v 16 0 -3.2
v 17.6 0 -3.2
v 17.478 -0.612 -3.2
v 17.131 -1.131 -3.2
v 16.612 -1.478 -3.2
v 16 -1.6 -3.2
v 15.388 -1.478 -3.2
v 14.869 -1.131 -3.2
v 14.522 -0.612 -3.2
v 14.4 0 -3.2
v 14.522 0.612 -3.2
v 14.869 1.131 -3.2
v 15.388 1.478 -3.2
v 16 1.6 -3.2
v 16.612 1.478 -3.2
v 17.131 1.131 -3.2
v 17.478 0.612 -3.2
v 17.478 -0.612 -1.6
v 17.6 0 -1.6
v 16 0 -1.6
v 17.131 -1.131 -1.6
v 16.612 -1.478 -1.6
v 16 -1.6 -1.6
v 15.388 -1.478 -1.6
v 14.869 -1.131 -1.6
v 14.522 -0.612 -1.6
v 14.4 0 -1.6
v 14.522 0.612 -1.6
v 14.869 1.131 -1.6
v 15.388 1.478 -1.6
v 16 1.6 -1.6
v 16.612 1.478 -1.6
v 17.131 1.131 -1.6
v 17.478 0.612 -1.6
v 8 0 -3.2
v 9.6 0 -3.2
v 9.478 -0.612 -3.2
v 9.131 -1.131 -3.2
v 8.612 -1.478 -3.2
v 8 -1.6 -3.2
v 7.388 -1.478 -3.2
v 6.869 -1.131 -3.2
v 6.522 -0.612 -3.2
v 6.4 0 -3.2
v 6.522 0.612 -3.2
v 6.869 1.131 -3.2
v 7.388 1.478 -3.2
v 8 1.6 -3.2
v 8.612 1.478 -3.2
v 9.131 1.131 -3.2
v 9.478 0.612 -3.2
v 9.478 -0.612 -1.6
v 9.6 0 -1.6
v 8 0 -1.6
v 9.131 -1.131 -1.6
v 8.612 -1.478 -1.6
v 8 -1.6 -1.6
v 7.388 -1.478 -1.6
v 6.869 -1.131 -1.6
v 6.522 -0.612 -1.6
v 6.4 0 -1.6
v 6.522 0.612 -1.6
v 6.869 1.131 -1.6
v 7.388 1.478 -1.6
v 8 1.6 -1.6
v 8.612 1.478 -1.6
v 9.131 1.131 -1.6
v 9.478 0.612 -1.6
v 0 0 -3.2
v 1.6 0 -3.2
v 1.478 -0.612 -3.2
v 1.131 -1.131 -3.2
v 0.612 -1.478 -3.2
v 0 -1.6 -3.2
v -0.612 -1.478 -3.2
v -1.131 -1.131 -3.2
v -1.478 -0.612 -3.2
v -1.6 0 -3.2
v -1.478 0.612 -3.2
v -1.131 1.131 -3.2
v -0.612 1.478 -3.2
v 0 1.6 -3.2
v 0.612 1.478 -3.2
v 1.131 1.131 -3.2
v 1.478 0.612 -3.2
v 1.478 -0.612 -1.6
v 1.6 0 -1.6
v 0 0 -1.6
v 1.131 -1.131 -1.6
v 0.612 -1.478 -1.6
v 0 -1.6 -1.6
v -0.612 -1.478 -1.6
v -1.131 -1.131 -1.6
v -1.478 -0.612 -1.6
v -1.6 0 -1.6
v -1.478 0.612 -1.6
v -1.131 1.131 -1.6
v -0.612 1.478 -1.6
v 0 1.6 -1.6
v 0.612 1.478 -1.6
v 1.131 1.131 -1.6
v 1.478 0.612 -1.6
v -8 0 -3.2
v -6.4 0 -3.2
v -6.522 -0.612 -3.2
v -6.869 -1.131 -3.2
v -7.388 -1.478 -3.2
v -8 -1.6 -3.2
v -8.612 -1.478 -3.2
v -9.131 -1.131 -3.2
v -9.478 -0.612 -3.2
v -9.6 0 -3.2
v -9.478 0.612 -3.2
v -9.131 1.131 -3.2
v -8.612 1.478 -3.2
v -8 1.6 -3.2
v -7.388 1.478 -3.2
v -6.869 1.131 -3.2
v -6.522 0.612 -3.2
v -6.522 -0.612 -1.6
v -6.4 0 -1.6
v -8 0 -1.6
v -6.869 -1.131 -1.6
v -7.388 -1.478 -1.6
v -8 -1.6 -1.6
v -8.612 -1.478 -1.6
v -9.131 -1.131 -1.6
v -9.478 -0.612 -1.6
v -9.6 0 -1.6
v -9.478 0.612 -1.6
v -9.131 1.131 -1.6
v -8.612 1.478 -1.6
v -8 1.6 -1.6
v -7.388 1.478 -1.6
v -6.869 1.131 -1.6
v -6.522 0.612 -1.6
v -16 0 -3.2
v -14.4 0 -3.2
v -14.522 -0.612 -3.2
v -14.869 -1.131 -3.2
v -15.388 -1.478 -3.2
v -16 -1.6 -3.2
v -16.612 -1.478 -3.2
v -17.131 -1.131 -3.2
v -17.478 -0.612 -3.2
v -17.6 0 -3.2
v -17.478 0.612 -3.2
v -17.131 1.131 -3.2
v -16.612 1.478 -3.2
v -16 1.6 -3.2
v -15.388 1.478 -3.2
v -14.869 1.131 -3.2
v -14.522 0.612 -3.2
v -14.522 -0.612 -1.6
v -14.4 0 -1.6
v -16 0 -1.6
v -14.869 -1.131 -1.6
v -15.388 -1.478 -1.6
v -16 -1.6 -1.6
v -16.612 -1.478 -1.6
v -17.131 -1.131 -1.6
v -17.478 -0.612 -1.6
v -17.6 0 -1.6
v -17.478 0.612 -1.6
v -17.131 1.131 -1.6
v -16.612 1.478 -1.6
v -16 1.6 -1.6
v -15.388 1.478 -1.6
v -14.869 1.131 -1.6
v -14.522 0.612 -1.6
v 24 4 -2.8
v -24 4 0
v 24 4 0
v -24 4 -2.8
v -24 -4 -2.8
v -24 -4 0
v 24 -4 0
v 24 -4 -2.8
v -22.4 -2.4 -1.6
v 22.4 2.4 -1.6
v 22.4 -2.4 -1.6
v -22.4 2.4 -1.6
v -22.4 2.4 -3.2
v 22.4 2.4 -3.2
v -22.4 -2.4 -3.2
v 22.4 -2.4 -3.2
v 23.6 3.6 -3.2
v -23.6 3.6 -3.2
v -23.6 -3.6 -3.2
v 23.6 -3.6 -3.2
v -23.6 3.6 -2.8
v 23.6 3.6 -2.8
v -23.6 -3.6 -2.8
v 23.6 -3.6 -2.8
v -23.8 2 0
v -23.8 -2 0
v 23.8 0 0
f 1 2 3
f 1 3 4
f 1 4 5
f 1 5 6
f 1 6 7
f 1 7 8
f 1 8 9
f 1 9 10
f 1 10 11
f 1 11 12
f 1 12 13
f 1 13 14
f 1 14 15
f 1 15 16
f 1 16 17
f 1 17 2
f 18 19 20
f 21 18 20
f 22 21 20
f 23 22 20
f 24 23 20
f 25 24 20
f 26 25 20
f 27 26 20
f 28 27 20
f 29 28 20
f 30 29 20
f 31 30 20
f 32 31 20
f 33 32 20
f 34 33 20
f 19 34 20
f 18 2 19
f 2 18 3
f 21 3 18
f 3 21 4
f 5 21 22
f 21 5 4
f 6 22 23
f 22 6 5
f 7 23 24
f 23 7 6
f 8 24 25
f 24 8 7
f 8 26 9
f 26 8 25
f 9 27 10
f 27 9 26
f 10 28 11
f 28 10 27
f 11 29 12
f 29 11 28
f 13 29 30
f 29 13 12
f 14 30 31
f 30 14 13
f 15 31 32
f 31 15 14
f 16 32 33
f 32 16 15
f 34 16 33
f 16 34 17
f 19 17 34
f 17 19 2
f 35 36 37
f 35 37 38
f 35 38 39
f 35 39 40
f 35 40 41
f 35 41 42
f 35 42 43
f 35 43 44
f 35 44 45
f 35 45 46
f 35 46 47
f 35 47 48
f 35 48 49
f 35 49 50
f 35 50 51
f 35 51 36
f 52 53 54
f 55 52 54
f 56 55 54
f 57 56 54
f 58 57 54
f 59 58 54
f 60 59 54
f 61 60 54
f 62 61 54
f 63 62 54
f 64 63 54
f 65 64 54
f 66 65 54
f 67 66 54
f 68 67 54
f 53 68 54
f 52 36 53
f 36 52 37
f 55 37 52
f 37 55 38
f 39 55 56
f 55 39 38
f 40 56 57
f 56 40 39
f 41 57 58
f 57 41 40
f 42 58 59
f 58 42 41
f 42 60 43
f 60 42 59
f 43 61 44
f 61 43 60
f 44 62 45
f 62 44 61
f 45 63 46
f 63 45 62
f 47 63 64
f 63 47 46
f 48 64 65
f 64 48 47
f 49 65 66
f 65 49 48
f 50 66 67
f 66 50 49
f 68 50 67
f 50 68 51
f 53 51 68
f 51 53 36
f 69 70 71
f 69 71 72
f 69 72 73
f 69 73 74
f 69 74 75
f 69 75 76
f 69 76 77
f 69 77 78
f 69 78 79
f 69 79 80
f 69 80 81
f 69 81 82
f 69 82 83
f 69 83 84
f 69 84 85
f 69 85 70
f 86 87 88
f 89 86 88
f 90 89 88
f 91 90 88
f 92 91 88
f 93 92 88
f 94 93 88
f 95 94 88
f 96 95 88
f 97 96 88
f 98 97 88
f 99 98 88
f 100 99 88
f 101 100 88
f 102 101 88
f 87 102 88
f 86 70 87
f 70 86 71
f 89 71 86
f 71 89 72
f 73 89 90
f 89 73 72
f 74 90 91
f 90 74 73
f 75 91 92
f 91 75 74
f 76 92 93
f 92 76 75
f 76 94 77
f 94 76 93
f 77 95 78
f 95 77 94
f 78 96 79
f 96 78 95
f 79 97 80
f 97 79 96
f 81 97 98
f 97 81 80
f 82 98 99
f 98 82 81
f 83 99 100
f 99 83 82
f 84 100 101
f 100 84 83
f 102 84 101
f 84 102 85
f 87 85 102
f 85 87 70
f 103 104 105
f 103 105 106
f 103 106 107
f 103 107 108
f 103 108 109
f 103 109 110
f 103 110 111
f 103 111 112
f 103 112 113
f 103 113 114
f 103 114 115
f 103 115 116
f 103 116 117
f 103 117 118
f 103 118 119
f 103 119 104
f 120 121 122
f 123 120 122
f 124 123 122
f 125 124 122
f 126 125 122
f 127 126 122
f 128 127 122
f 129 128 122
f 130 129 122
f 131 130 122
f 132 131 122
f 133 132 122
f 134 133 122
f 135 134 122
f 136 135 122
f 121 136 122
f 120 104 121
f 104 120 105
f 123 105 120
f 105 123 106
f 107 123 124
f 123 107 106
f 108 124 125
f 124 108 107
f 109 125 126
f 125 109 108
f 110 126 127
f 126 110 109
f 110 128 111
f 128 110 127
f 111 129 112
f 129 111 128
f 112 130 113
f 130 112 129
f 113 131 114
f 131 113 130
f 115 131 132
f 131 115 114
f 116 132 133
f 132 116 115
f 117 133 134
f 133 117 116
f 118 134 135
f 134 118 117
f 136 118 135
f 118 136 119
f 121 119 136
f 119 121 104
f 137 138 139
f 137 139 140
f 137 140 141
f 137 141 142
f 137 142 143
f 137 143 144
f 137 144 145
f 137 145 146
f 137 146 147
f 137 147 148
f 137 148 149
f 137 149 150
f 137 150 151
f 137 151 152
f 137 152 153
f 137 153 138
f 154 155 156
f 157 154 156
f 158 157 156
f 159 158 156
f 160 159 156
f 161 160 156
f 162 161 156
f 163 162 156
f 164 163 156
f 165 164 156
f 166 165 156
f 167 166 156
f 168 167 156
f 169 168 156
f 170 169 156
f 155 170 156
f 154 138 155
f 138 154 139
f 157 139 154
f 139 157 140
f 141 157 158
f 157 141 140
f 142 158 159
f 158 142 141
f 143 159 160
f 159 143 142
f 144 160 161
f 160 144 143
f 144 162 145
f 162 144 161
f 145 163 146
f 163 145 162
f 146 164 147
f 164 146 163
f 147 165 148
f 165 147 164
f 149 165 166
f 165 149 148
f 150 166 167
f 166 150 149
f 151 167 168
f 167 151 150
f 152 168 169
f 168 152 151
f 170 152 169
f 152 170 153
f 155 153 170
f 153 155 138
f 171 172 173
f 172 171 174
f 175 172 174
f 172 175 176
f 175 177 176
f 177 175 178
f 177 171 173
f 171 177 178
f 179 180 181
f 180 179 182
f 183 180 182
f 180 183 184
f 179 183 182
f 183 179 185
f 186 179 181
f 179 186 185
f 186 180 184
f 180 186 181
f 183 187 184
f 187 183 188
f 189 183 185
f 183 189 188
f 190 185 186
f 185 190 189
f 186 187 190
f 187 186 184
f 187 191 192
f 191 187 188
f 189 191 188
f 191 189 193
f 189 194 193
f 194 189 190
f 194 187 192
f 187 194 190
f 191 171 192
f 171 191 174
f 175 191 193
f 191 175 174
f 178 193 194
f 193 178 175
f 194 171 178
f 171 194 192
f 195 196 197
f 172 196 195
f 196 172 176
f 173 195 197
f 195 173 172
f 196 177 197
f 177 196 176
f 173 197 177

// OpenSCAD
// file: ../p/4-4edge.scad
use <../lib.scad>
function ldraw_lib__4_4edge() = [
// 0 Circle 1.0
// 0 Name: 4-4edge.dat
// 0 Author: James Jessiman
// 0 !LDRAW_ORG Primitive UPDATE 2017-01
// 0 !LICENSE Licensed under CC BY 2.0 and CC BY 4.0 : see CAreadme.txt
// 
// 0 BFC CERTIFY CCW
  [0,"BFC","CERTIFY"],
  [0,"BFC","CCW"],
// 
// 0 !HISTORY 1998-12-15 [PTadmin] Official Update 1998-10
// 0 !HISTORY 2005-12-28 [PTadmin] Official Update 2005-01
// 0 !HISTORY 2007-06-24 [PTadmin] Header formatted for Contributor Agreement
// 0 !HISTORY 2008-07-01 [PTadmin] Official Update 2008-01
// 0 !HISTORY 2017-01-15 [Steffen] BFCed
// 0 !HISTORY 2017-12-30 [PTadmin] Official Update 2017-01
// 
// 
// 2 24 1 0 0 0.9239 0 0.3827
  [2,24,1,0,0,0.9239,0,0.3827],
// 2 24 0.9239 0 0.3827 0.7071 0 0.7071
  [2,24,0.9239,0,0.3827,0.7071,0,0.7071],
// 2 24 0.7071 0 0.7071 0.3827 0 0.9239
  [2,24,0.7071,0,0.7071,0.3827,0,0.9239],
// 2 24 0.3827 0 0.9239 0 0 1
  [2,24,0.3827,0,0.9239,0,0,1],
// 2 24 0 0 1 -0.3827 0 0.9239
  [2,24,0,0,1,-0.3827,0,0.9239],
// 2 24 -0.3827 0 0.9239 -0.7071 0 0.7071
  [2,24,-0.3827,0,0.9239,-0.7071,0,0.7071],
// 2 24 -0.7071 0 0.7071 -0.9239 0 0.3827
  [2,24,-0.7071,0,0.7071,-0.9239,0,0.3827],
// 2 24 -0.9239 0 0.3827 -1 0 -0
  [2,24,-0.9239,0,0.3827,-1,0,-0],
// 2 24 -1 0 -0 -0.9239 0 -0.3827
  [2,24,-1,0,-0,-0.9239,0,-0.3827],
// 2 24 -0.9239 0 -0.3827 -0.7071 0 -0.7071
  [2,24,-0.9239,0,-0.3827,-0.7071,0,-0.7071],
// 2 24 -0.7071 0 -0.7071 -0.3827 0 -0.9239
  [2,24,-0.7071,0,-0.7071,-0.3827,0,-0.9239],
// 2 24 -0.3827 0 -0.9239 0 0 -1
  [2,24,-0.3827,0,-0.9239,0,0,-1],
// 2 24 0 0 -1 0.3827 0 -0.9239
  [2,24,0,0,-1,0.3827,0,-0.9239],
// 2 24 0.3827 0 -0.9239 0.7071 0 -0.7071
  [2,24,0.3827,0,-0.9239,0.7071,0,-0.7071],
// 2 24 0.7071 0 -0.7071 0.9239 0 -0.3827
  [2,24,0.7071,0,-0.7071,0.9239,0,-0.3827],
// 2 24 0.9239 0 -0.3827 1 0 0
  [2,24,0.9239,0,-0.3827,1,0,0],
];
module ldraw_lib__4_4edge(step=0, col=false, unit=2/5, alt=false, line=0.2, solid=!$preview)
    makepoly(ldraw_lib__4_4edge(), step=step, col=col, unit=unit, alt=alt, line=line, solid=solid);
ldraw_lib__4_4edge(line=0.2);
// file: ../p/4-4disc.scad
use <../lib.scad>
function ldraw_lib__4_4disc() = [
// 0 Disc 1.0
// 0 Name: 4-4disc.dat
// 0 Author: James Jessiman
// 0 !LDRAW_ORG Primitive UPDATE 2002-02
// 0 !LICENSE Licensed under CC BY 2.0 and CC BY 4.0 : see CAreadme.txt
// 
// 0 BFC CERTIFY CCW
  [0,"BFC","CERTIFY"],
  [0,"BFC","CCW"],
// 
// 0 !HISTORY 1998-12-15 [PTadmin] Official Update 1998-10
// 0 !HISTORY 2002-03-23 [sbliss] Added BFC statement
// 0 !HISTORY 2002-04-25 [PTadmin] Official Update 2002-02
// 0 !HISTORY 2007-06-24 [PTadmin] Header formatted for Contributor Agreement
// 0 !HISTORY 2008-07-01 [PTadmin] Official Update 2008-01
// 
// 
// 3 16 0 0 0 1 0 0 0.9239 0 0.3827
  [3,16,0,0,0,1,0,0,0.9239,0,0.3827],
// 3 16 0 0 0 0.9239 0 0.3827 0.7071 0 0.7071
  [3,16,0,0,0,0.9239,0,0.3827,0.7071,0,0.7071],
// 3 16 0 0 0 0.7071 0 0.7071 0.3827 0 0.9239
  [3,16,0,0,0,0.7071,0,0.7071,0.3827,0,0.9239],
// 3 16 0 0 0 0.3827 0 0.9239 0 0 1
  [3,16,0,0,0,0.3827,0,0.9239,0,0,1],
// 3 16 0 0 0 0 0 1 -0.3827 0 0.9239
  [3,16,0,0,0,0,0,1,-0.3827,0,0.9239],
// 3 16 0 0 0 -0.3827 0 0.9239 -0.7071 0 0.7071
  [3,16,0,0,0,-0.3827,0,0.9239,-0.7071,0,0.7071],
// 3 16 0 0 0 -0.7071 0 0.7071 -0.9239 0 0.3827
  [3,16,0,0,0,-0.7071,0,0.7071,-0.9239,0,0.3827],
// 3 16 0 0 0 -0.9239 0 0.3827 -1 0 -0
  [3,16,0,0,0,-0.9239,0,0.3827,-1,0,-0],
// 3 16 0 0 0 -1 0 -0 -0.9239 0 -0.3827
  [3,16,0,0,0,-1,0,-0,-0.9239,0,-0.3827],
// 3 16 0 0 0 -0.9239 0 -0.3827 -0.7071 0 -0.7071
  [3,16,0,0,0,-0.9239,0,-0.3827,-0.7071,0,-0.7071],
// 3 16 0 0 0 -0.7071 0 -0.7071 -0.3827 0 -0.9239
  [3,16,0,0,0,-0.7071,0,-0.7071,-0.3827,0,-0.9239],
// 3 16 0 0 0 -0.3827 0 -0.9239 0 0 -1
  [3,16,0,0,0,-0.3827,0,-0.9239,0,0,-1],
// 3 16 0 0 0 0 0 -1 0.3827 0 -0.9239
  [3,16,0,0,0,0,0,-1,0.3827,0,-0.9239],
// 3 16 0 0 0 0.3827 0 -0.9239 0.7071 0 -0.7071
  [3,16,0,0,0,0.3827,0,-0.9239,0.7071,0,-0.7071],
// 3 16 0 0 0 0.7071 0 -0.7071 0.9239 0 -0.3827
  [3,16,0,0,0,0.7071,0,-0.7071,0.9239,0,-0.3827],
// 3 16 0 0 0 0.9239 0 -0.3827 1 0 0
  [3,16,0,0,0,0.9239,0,-0.3827,1,0,0],
// 0
];
module ldraw_lib__4_4disc(step=0, col=false, unit=2/5, alt=false, line=0.2, solid=!$preview)
    makepoly(ldraw_lib__4_4disc(), step=step, col=col, unit=unit, alt=alt, line=line, solid=solid);
ldraw_lib__4_4disc(line=0.2);
// file: ../p/4-4cyli.scad
use <../lib.scad>
$fa=1; $fs=0.2;
function ldraw_lib__4_4cyli(realsolid=false) = [
// 0 Cylinder 1.0
// 0 Name: 4-4cyli.dat
// 0 Author: James Jessiman
// 0 !LDRAW_ORG Primitive UPDATE 2005-01
// 0 !LICENSE Licensed under CC BY 2.0 and CC BY 4.0 : see CAreadme.txt
// 
// 0 BFC CERTIFY CCW
  [0,"BFC","CERTIFY"],
  [0,"BFC","CCW"],
// 
// 0 !HISTORY 1998-12-15 [PTadmin] Official Update 1998-10
// 0 !HISTORY 2002-03-23 [sbliss] Added BFC statement; merged headers from files in distributions LDraw 0.27 and Complete.
// 0 !HISTORY 2002-04-25 [PTadmin] Official Update 2002-02
// 0 !HISTORY 2004-12-14 [guyvivan] BFC CCW
// 0 !HISTORY 2005-12-28 [PTadmin] Official Update 2005-01
// 0 !HISTORY 2007-06-24 [PTadmin] Header formatted for Contributor Agreement
// 0 !HISTORY 2008-07-01 [PTadmin] Official Update 2008-01
// 
// 
// 4 16 1 1 0 0.9239 1 0.3827 0.9239 0 0.3827 1 0 0
  [4,16,1,1,0,0.9239,1,0.3827,0.9239,0,0.3827,1,0,0],
// 5 24 1 0 0 1 1 0 0.9239 0 0.3827 0.9239 0 -0.3827
  [5,24,1,0,0,1,1,0,0.9239,0,0.3827,0.9239,0,-0.3827],
// 4 16 0.9239 1 0.3827 0.7071 1 0.7071 0.7071 0 0.7071 0.9239 0 0.3827
  [4,16,0.9239,1,0.3827,0.7071,1,0.7071,0.7071,0,0.7071,0.9239,0,0.3827],
// 5 24 0.9239 0 0.3827 0.9239 1 0.3827 0.7071 0 0.7071 1 0 0
  [5,24,0.9239,0,0.3827,0.9239,1,0.3827,0.7071,0,0.7071,1,0,0],
// 4 16 0.7071 1 0.7071 0.3827 1 0.9239 0.3827 0 0.9239 0.7071 0 0.7071
  [4,16,0.7071,1,0.7071,0.3827,1,0.9239,0.3827,0,0.9239,0.7071,0,0.7071],
// 5 24 0.7071 0 0.7071 0.7071 1 0.7071 0.3827 0 0.9239 0.9239 0 0.3827
  [5,24,0.7071,0,0.7071,0.7071,1,0.7071,0.3827,0,0.9239,0.9239,0,0.3827],
// 4 16 0.3827 1 0.9239 0 1 1 0 0 1 0.3827 0 0.9239
  [4,16,0.3827,1,0.9239,0,1,1,0,0,1,0.3827,0,0.9239],
// 5 24 0.3827 0 0.9239 0.3827 1 0.9239 0 0 1 0.7071 0 0.7071
  [5,24,0.3827,0,0.9239,0.3827,1,0.9239,0,0,1,0.7071,0,0.7071],
// 4 16 0 1 1 -0.3827 1 0.9239 -0.3827 0 0.9239 0 0 1
  [4,16,0,1,1,-0.3827,1,0.9239,-0.3827,0,0.9239,0,0,1],
// 5 24 0 0 1 0 1 1 -0.3827 0 0.9239 0.3827 0 0.9239
  [5,24,0,0,1,0,1,1,-0.3827,0,0.9239,0.3827,0,0.9239],
// 4 16 -0.3827 1 0.9239 -0.7071 1 0.7071 -0.7071 0 0.7071 -0.3827 0 0.9239
  [4,16,-0.3827,1,0.9239,-0.7071,1,0.7071,-0.7071,0,0.7071,-0.3827,0,0.9239],
// 5 24 -0.3827 0 0.9239 -0.3827 1 0.9239 -0.7071 0 0.7071 0 0 1
  [5,24,-0.3827,0,0.9239,-0.3827,1,0.9239,-0.7071,0,0.7071,0,0,1],
// 4 16 -0.7071 1 0.7071 -0.9239 1 0.3827 -0.9239 0 0.3827 -0.7071 0 0.7071
  [4,16,-0.7071,1,0.7071,-0.9239,1,0.3827,-0.9239,0,0.3827,-0.7071,0,0.7071],
// 5 24 -0.7071 0 0.7071 -0.7071 1 0.7071 -0.9239 0 0.3827 -0.3827 0 0.9239
  [5,24,-0.7071,0,0.7071,-0.7071,1,0.7071,-0.9239,0,0.3827,-0.3827,0,0.9239],
// 4 16 -0.9239 1 0.3827 -1 1 0 -1 0 0 -0.9239 0 0.3827
  [4,16,-0.9239,1,0.3827,-1,1,0,-1,0,0,-0.9239,0,0.3827],
// 5 24 -0.9239 0 0.3827 -0.9239 1 0.3827 -1 0 0 -0.7071 0 0.7071
  [5,24,-0.9239,0,0.3827,-0.9239,1,0.3827,-1,0,0,-0.7071,0,0.7071],
// 4 16 -1 1 0 -0.9239 1 -0.3827 -0.9239 0 -0.3827 -1 0 0
  [4,16,-1,1,0,-0.9239,1,-0.3827,-0.9239,0,-0.3827,-1,0,0],
// 5 24 -1 0 0 -1 1 0 -0.9239 0 -0.3827 -0.9239 0 0.3827
  [5,24,-1,0,0,-1,1,0,-0.9239,0,-0.3827,-0.9239,0,0.3827],
// 4 16 -0.9239 1 -0.3827 -0.7071 1 -0.7071 -0.7071 0 -0.7071 -0.9239 0 -0.3827
  [4,16,-0.9239,1,-0.3827,-0.7071,1,-0.7071,-0.7071,0,-0.7071,-0.9239,0,-0.3827],
// 5 24 -0.9239 0 -0.3827 -0.9239 1 -0.3827 -0.7071 0 -0.7071 -1 0 0
  [5,24,-0.9239,0,-0.3827,-0.9239,1,-0.3827,-0.7071,0,-0.7071,-1,0,0],
// 4 16 -0.7071 1 -0.7071 -0.3827 1 -0.9239 -0.3827 0 -0.9239 -0.7071 0 -0.7071
  [4,16,-0.7071,1,-0.7071,-0.3827,1,-0.9239,-0.3827,0,-0.9239,-0.7071,0,-0.7071],
// 5 24 -0.7071 0 -0.7071 -0.7071 1 -0.7071 -0.3827 0 -0.9239 -0.9239 0 -0.3827
  [5,24,-0.7071,0,-0.7071,-0.7071,1,-0.7071,-0.3827,0,-0.9239,-0.9239,0,-0.3827],
// 4 16 -0.3827 1 -0.9239 0 1 -1 0 0 -1 -0.3827 0 -0.9239
  [4,16,-0.3827,1,-0.9239,0,1,-1,0,0,-1,-0.3827,0,-0.9239],
// 5 24 -0.3827 0 -0.9239 -0.3827 1 -0.9239 0 0 -1 -0.7071 0 -0.7071
  [5,24,-0.3827,0,-0.9239,-0.3827,1,-0.9239,0,0,-1,-0.7071,0,-0.7071],
// 4 16 0 1 -1 0.3827 1 -0.9239 0.3827 0 -0.9239 0 0 -1
  [4,16,0,1,-1,0.3827,1,-0.9239,0.3827,0,-0.9239,0,0,-1],
// 5 24 0 0 -1 0 1 -1 0.3827 0 -0.9239 -0.3827 0 -0.9239
  [5,24,0,0,-1,0,1,-1,0.3827,0,-0.9239,-0.3827,0,-0.9239],
// 4 16 0.3827 1 -0.9239 0.7071 1 -0.7071 0.7071 0 -0.7071 0.3827 0 -0.9239
  [4,16,0.3827,1,-0.9239,0.7071,1,-0.7071,0.7071,0,-0.7071,0.3827,0,-0.9239],
// 5 24 0.3827 0 -0.9239 0.3827 1 -0.9239 0.7071 0 -0.7071 0 0 -1
  [5,24,0.3827,0,-0.9239,0.3827,1,-0.9239,0.7071,0,-0.7071,0,0,-1],
// 4 16 0.7071 1 -0.7071 0.9239 1 -0.3827 0.9239 0 -0.3827 0.7071 0 -0.7071
  [4,16,0.7071,1,-0.7071,0.9239,1,-0.3827,0.9239,0,-0.3827,0.7071,0,-0.7071],
// 5 24 0.7071 0 -0.7071 0.7071 1 -0.7071 0.9239 0 -0.3827 0.3827 0 -0.9239
  [5,24,0.7071,0,-0.7071,0.7071,1,-0.7071,0.9239,0,-0.3827,0.3827,0,-0.9239],
// 4 16 0.9239 1 -0.3827 1 1 0 1 0 0 0.9239 0 -0.3827
  [4,16,0.9239,1,-0.3827,1,1,0,1,0,0,0.9239,0,-0.3827],
// 5 24 0.9239 0 -0.3827 0.9239 1 -0.3827 1 0 0 0.7071 0 -0.7071
  [5,24,0.9239,0,-0.3827,0.9239,1,-0.3827,1,0,0,0.7071,0,-0.7071],
// 0
];
module ldraw_lib__4_4cyli(step=0, col=false, unit=2/5, alt=false, line=0.2, solid=!$preview)
    makepoly(ldraw_lib__4_4cyli(solid), step=step, col=col, unit=unit, alt=alt, line=line, solid=solid);
ldraw_lib__4_4cyli(line=0.2);
// file: ../p/stud3.scad
use <../lib.scad>
use <4-4cyli.scad>
use <4-4disc.scad>
use <4-4edge.scad>
function ldraw_lib__stud3() = [
// 0 Stud Tube Solid
// 0 Name: stud3.dat
// 0 Author: James Jessiman
// 0 !LDRAW_ORG Primitive UPDATE 2012-01
// 0 !LICENSE Licensed under CC BY 4.0 : see CAreadme.txt
// 
// 0 BFC CERTIFY CCW
  [0,"BFC","CERTIFY"],
  [0,"BFC","CCW"],
// 
// 0 !HISTORY 2002-04-04 [sbliss] Modified for BFC compliance
// 0 !HISTORY 2002-04-25 [PTadmin] Official Update 2002-02
// 0 !HISTORY 2007-06-24 [PTadmin] Header formatted for Contributor Agreement
// 0 !HISTORY 2008-07-01 [PTadmin] Official Update 2008-01
// 0 !HISTORY 2012-02-16 [Philo] Changed to CCW
// 0 !HISTORY 2012-03-30 [PTadmin] Official Update 2012-01
// 
// 
// 1 16 0 -4 0 4 0 0 0 1 0 0 0 4 4-4edge.dat
  [1,16,0,-4,0,4,0,0,0,1,0,0,0,4, ldraw_lib__4_4edge()],
// 1 16 0 0 0 4 0 0 0 1 0 0 0 4 4-4edge.dat
  [1,16,0,0,0,4,0,0,0,1,0,0,0,4, ldraw_lib__4_4edge()],
// 1 16 0 -4 0 4 0 0 0 1 0 0 0 4 4-4disc.dat
  [1,16,0,-4,0,4,0,0,0,1,0,0,0,4, ldraw_lib__4_4disc()],
  [-1,16,0,0,0,4,0,0,0,-1,0,0,0,4, ldraw_lib__4_4disc()],
// 1 16 0 -4 0 4 0 0 0 4 0 0 0 4 4-4cyli.dat
  [1,16,0,-4,0,4,0,0,0,4,0,0,0,4, ldraw_lib__4_4cyli()],
];
module ldraw_lib__stud3(step=0, col=false, unit=2/5, alt=false, line=0.2, solid=!$preview)
    makepoly(ldraw_lib__stud3(), step=step, col=col, unit=unit, alt=alt, line=line, solid=solid);
ldraw_lib__stud3(line=0.2);
// file: ../p/box5.scad
use <../lib.scad>
function ldraw_lib__box5() = [
// 0 Box with 5 Faces and All Edges
// 0 Name: box5.dat
// 0 Author: James Jessiman
// 0 !LDRAW_ORG Primitive UPDATE 2012-01
// 0 !LICENSE Licensed under CC BY 2.0 and CC BY 4.0 : see CAreadme.txt
// 
// 0 BFC CERTIFY CCW
  [0,"BFC","CERTIFY"],
  [0,"BFC","CCW"],
// 
// 0 !HISTORY 2002-04-03 [sbliss] Modified for BFC compliance
// 0 !HISTORY 2002-04-25 [PTadmin] Official Update 2002-02
// 0 !HISTORY 2007-06-24 [PTadmin] Header formatted for Contributor Agreement
// 0 !HISTORY 2008-07-01 [PTadmin] Official Update 2008-01
// 0 !HISTORY 2012-02-16 [Philo] Changed to CCW
// 0 !HISTORY 2012-03-30 [PTadmin] Official Update 2012-01
// 
// 
// 2 24 1 1 1 -1 1 1
  [2,24,1,1,1,-1,1,1],
// 2 24 -1 1 1 -1 1 -1
  [2,24,-1,1,1,-1,1,-1],
// 2 24 -1 1 -1 1 1 -1
  [2,24,-1,1,-1,1,1,-1],
// 2 24 1 1 -1 1 1 1
  [2,24,1,1,-1,1,1,1],
// 2 24 1 0 1 -1 0 1
  [2,24,1,0,1,-1,0,1],
// 2 24 -1 0 1 -1 0 -1
  [2,24,-1,0,1,-1,0,-1],
// 2 24 -1 0 -1 1 0 -1
  [2,24,-1,0,-1,1,0,-1],
// 2 24 1 0 -1 1 0 1
  [2,24,1,0,-1,1,0,1],
// 2 24 1 0 1 1 1 1
  [2,24,1,0,1,1,1,1],
// 2 24 -1 0 1 -1 1 1
  [2,24,-1,0,1,-1,1,1],
// 2 24 1 0 -1 1 1 -1
  [2,24,1,0,-1,1,1,-1],
// 2 24 -1 0 -1 -1 1 -1
  [2,24,-1,0,-1,-1,1,-1],
// 4 16 -1 1 1 1 1 1 1 1 -1 -1 1 -1
  [4,16,-1,1,1,1,1,1,1,1,-1,-1,1,-1],
// 4 16 -1 1 1 -1 0 1 1 0 1 1 1 1
  [4,16,-1,1,1,-1,0,1,1,0,1,1,1,1],
// 4 16 -1 1 -1 -1 0 -1 -1 0 1 -1 1 1
  [4,16,-1,1,-1,-1,0,-1,-1,0,1,-1,1,1],
// 4 16 1 1 -1 1 0 -1 -1 0 -1 -1 1 -1
  [4,16,1,1,-1,1,0,-1,-1,0,-1,-1,1,-1],
// 4 16 1 1 1 1 0 1 1 0 -1 1 1 -1
  [4,16,1,1,1,1,0,1,1,0,-1,1,1,-1],
];
makepoly(ldraw_lib__box5(), line=0.2);
// file: ../p/box4.scad
use <../lib.scad>
function ldraw_lib__box4() = [
// 0 Box with 4 Faces (2 Parallel Pairs) and All Edges
// 0 Name: box4.dat
// 0 Author: James Jessiman
// 0 !LDRAW_ORG Primitive UPDATE 2012-01
// 0 !LICENSE Licensed under CC BY 4.0 : see CAreadme.txt
// 
// 0 BFC CERTIFY CCW
  [0,"BFC","CERTIFY"],
  [0,"BFC","CCW"],
// 
// 0 !HISTORY 2002-04-03 [sbliss] Modified for BFC compliance
// 0 !HISTORY 2002-04-25 [PTadmin] Official Update 2002-02
// 0 !HISTORY 2007-06-24 [PTadmin] Header formatted for Contributor Agreement
// 0 !HISTORY 2008-07-01 [PTadmin] Official Update 2008-01
// 0 !HISTORY 2012-02-16 [Philo] Changed to CCW
// 0 !HISTORY 2012-03-30 [PTadmin] Official Update 2012-01
// 
// 
// 2 24 1 1 1 -1 1 1
  [2,24,1,1,1,-1,1,1],
// 2 24 -1 1 1 -1 1 -1
  [2,24,-1,1,1,-1,1,-1],
// 2 24 -1 1 -1 1 1 -1
  [2,24,-1,1,-1,1,1,-1],
// 2 24 1 1 -1 1 1 1
  [2,24,1,1,-1,1,1,1],
// 2 24 1 0 1 -1 0 1
  [2,24,1,0,1,-1,0,1],
// 2 24 -1 0 1 -1 0 -1
  [2,24,-1,0,1,-1,0,-1],
// 2 24 -1 0 -1 1 0 -1
  [2,24,-1,0,-1,1,0,-1],
// 2 24 1 0 -1 1 0 1
  [2,24,1,0,-1,1,0,1],
// 2 24 1 0 1 1 1 1
  [2,24,1,0,1,1,1,1],
// 2 24 -1 0 1 -1 1 1
  [2,24,-1,0,1,-1,1,1],
// 2 24 1 0 -1 1 1 -1
  [2,24,1,0,-1,1,1,-1],
// 2 24 -1 0 -1 -1 1 -1
  [2,24,-1,0,-1,-1,1,-1],
// 4 16 -1 1 1 -1 0 1 1 0 1 1 1 1
  [4,16,-1,1,1,-1,0,1,1,0,1,1,1,1],
// 4 16 -1 1 -1 -1 0 -1 -1 0 1 -1 1 1
  [4,16,-1,1,-1,-1,0,-1,-1,0,1,-1,1,1],
// 4 16 1 1 -1 1 0 -1 -1 0 -1 -1 1 -1
  [4,16,1,1,-1,1,0,-1,-1,0,-1,-1,1,-1],
// 4 16 1 1 1 1 0 1 1 0 -1 1 1 -1
  [4,16,1,1,1,1,0,1,1,0,-1,1,1,-1],
];
module ldraw_lib__box4(step=0, col=false, unit=2/5, alt=false, line=0.2, solid=!$preview)
    makepoly(ldraw_lib__box4(), step=step, col=col, unit=unit, alt=alt, line=line, solid=solid);
ldraw_lib__box4(line=0.2);
// file: s/6636s01.scad
use <../../lib.scad>
use <../../p/box4.scad>
use <../../p/box5.scad>
use <../../p/stud3.scad>
function ldraw_lib__s__6636s01() = [
// 0 ~Tile  1 x  6 without Top Face
// 0 Name: s\6636s01.dat
// 0 Author: C.L.Rasmussen [johnny-thunder]
// 0 !LDRAW_ORG Subpart UPDATE 2009-03
// 0 !LICENSE Licensed under CC BY 2.0 and CC BY 4.0 : see CAreadme.txt
// 
// 0 BFC CERTIFY CCW
  [0,"BFC","CERTIFY"],
  [0,"BFC","CCW"],
// 
// 0 !HISTORY 2009-12-29 [PTadmin] Official Update 2009-03
// 
// 
// 1 16 40 4 0 1 0 0 0 -1 0 0 0 -1 stud3.dat
  [1,16,40,4,0,1,0,0,0,-1,0,0,0,-1, ldraw_lib__stud3()],
// 1 16 20 4 0 1 0 0 0 -1 0 0 0 -1 stud3.dat
  [1,16,20,4,0,1,0,0,0,-1,0,0,0,-1, ldraw_lib__stud3()],
// 1 16 0 4 0 1 0 0 0 -1 0 0 0 -1 stud3.dat
  [1,16,0,4,0,1,0,0,0,-1,0,0,0,-1, ldraw_lib__stud3()],
// 1 16 -20 4 0 1 0 0 0 -1 0 0 0 -1 stud3.dat
  [1,16,-20,4,0,1,0,0,0,-1,0,0,0,-1, ldraw_lib__stud3()],
// 1 16 -40 4 0 1 0 0 0 -1 0 0 0 -1 stud3.dat
  [1,16,-40,4,0,1,0,0,0,-1,0,0,0,-1, ldraw_lib__stud3()],
// 1 16 0 7 0 60 0 0 0 -7 0 0 0 10 box4.dat
  [1,16,0,7,0,60,0,0,0,-7,0,0,0,10, ldraw_lib__box4()],
// 0 BFC INVERTNEXT
  [0,"BFC","INVERTNEXT"],
// 1 16 0 8 0 56 0 0 0 -4 0 0 0 6 box5.dat
  [1,16,0,8,0,56,0,0,0,-4,0,0,0,6, ldraw_lib__box5()],
// 4 16 59 8 9 56 8 6 -56 8 6 -59 8 9
  [4,16,59,8,9,56,8,6,-56,8,6,-59,8,9],
// 4 16 -59 8 9 -56 8 6 -56 8 -6 -59 8 -9
  [4,16,-59,8,9,-56,8,6,-56,8,-6,-59,8,-9],
// 4 16 -59 8 -9 -56 8 -6 56 8 -6 59 8 -9
  [4,16,-59,8,-9,-56,8,-6,56,8,-6,59,8,-9],
// 4 16 59 8 -9 56 8 -6 56 8 6 59 8 9
  [4,16,59,8,-9,56,8,-6,56,8,6,59,8,9],
// 1 16 0 8 0 59 0 0 0 -1 0 0 0 9 box4.dat
  [1,16,0,8,0,59,0,0,0,-1,0,0,0,9, ldraw_lib__box4()],
// 4 16 60 7 10 59 7 9 -59 7 9 -60 7 10
  [4,16,60,7,10,59,7,9,-59,7,9,-60,7,10],
// 4 16 -60 7 10 -59 7 9 -59 7 -9 -60 7 -10
  [4,16,-60,7,10,-59,7,9,-59,7,-9,-60,7,-10],
// 4 16 -60 7 -10 -59 7 -9 59 7 -9 60 7 -10
  [4,16,-60,7,-10,-59,7,-9,59,7,-9,60,7,-10],
// 4 16 60 7 -10 59 7 -9 59 7 9 60 7 10
  [4,16,60,7,-10,59,7,-9,59,7,9,60,7,10],
// 0
];
makepoly(ldraw_lib__s__6636s01(), line=0.2);
// main file
use <../lib.scad>
use <s/6636s01.scad>
function ldraw_lib__6636p0e() = [
// 0 Tile  1 x  6 with Red Triangle Pattern
// 0 Name: 6636p0e.dat
// 0 Author: Florent Faramond [Makou]
// 0 !LDRAW_ORG Part UPDATE 2024-07
// 0 !LICENSE Licensed under CC BY 4.0 : see CAreadme.txt
// 
// 0 BFC CERTIFY CCW
  [0,"BFC","CERTIFY"],
  [0,"BFC","CCW"],
// 
// 0 !KEYWORDS Bricklink 6636pb331, Rebrickable 6636pr0039, Set 10318
// 
// 0 !HISTORY 2024-08-26 [OrionP] Official Update 2024-07
// 
// 1 16 0 0 0 1 0 0 0 1 0 0 0 1 s\6636s01.dat
  [1,16,0,0,0,1,0,0,0,1,0,0,0,1, ldraw_lib__s__6636s01()],
// 
// 3 4 -59.5 0 5 -59.5 0 -5 59.5 0 0
  [3,4,-59.5,0,5,-59.5,0,-5,59.5,0,0],
// 4 16 -60 0 -10 -59.5 0 -5 -59.5 0 5 -60 0 10
  [4,16,-60,0,-10,-59.5,0,-5,-59.5,0,5,-60,0,10],
// 4 16 -60 0 10 -59.5 0 5 59.5 0 0 60 0 10
  [4,16,-60,0,10,-59.5,0,5,59.5,0,0,60,0,10],
// 4 16 59.5 0 0 -59.5 0 -5 -60 0 -10 60 0 -10
  [4,16,59.5,0,0,-59.5,0,-5,-60,0,-10,60,0,-10],
// 3 16 60 0 10 59.5 0 0 60 0 -10
  [3,16,60,0,10,59.5,0,0,60,0,-10],
];
module ldraw_lib__6636p0e(step=0, col=false, unit=2/5, alt=false, line=0.2, solid=!$preview)
    makepoly(ldraw_lib__6636p0e(), step=step, col=col, unit=unit, alt=alt, line=line, solid=solid);
ldraw_lib__6636p0e(line=0.2);
